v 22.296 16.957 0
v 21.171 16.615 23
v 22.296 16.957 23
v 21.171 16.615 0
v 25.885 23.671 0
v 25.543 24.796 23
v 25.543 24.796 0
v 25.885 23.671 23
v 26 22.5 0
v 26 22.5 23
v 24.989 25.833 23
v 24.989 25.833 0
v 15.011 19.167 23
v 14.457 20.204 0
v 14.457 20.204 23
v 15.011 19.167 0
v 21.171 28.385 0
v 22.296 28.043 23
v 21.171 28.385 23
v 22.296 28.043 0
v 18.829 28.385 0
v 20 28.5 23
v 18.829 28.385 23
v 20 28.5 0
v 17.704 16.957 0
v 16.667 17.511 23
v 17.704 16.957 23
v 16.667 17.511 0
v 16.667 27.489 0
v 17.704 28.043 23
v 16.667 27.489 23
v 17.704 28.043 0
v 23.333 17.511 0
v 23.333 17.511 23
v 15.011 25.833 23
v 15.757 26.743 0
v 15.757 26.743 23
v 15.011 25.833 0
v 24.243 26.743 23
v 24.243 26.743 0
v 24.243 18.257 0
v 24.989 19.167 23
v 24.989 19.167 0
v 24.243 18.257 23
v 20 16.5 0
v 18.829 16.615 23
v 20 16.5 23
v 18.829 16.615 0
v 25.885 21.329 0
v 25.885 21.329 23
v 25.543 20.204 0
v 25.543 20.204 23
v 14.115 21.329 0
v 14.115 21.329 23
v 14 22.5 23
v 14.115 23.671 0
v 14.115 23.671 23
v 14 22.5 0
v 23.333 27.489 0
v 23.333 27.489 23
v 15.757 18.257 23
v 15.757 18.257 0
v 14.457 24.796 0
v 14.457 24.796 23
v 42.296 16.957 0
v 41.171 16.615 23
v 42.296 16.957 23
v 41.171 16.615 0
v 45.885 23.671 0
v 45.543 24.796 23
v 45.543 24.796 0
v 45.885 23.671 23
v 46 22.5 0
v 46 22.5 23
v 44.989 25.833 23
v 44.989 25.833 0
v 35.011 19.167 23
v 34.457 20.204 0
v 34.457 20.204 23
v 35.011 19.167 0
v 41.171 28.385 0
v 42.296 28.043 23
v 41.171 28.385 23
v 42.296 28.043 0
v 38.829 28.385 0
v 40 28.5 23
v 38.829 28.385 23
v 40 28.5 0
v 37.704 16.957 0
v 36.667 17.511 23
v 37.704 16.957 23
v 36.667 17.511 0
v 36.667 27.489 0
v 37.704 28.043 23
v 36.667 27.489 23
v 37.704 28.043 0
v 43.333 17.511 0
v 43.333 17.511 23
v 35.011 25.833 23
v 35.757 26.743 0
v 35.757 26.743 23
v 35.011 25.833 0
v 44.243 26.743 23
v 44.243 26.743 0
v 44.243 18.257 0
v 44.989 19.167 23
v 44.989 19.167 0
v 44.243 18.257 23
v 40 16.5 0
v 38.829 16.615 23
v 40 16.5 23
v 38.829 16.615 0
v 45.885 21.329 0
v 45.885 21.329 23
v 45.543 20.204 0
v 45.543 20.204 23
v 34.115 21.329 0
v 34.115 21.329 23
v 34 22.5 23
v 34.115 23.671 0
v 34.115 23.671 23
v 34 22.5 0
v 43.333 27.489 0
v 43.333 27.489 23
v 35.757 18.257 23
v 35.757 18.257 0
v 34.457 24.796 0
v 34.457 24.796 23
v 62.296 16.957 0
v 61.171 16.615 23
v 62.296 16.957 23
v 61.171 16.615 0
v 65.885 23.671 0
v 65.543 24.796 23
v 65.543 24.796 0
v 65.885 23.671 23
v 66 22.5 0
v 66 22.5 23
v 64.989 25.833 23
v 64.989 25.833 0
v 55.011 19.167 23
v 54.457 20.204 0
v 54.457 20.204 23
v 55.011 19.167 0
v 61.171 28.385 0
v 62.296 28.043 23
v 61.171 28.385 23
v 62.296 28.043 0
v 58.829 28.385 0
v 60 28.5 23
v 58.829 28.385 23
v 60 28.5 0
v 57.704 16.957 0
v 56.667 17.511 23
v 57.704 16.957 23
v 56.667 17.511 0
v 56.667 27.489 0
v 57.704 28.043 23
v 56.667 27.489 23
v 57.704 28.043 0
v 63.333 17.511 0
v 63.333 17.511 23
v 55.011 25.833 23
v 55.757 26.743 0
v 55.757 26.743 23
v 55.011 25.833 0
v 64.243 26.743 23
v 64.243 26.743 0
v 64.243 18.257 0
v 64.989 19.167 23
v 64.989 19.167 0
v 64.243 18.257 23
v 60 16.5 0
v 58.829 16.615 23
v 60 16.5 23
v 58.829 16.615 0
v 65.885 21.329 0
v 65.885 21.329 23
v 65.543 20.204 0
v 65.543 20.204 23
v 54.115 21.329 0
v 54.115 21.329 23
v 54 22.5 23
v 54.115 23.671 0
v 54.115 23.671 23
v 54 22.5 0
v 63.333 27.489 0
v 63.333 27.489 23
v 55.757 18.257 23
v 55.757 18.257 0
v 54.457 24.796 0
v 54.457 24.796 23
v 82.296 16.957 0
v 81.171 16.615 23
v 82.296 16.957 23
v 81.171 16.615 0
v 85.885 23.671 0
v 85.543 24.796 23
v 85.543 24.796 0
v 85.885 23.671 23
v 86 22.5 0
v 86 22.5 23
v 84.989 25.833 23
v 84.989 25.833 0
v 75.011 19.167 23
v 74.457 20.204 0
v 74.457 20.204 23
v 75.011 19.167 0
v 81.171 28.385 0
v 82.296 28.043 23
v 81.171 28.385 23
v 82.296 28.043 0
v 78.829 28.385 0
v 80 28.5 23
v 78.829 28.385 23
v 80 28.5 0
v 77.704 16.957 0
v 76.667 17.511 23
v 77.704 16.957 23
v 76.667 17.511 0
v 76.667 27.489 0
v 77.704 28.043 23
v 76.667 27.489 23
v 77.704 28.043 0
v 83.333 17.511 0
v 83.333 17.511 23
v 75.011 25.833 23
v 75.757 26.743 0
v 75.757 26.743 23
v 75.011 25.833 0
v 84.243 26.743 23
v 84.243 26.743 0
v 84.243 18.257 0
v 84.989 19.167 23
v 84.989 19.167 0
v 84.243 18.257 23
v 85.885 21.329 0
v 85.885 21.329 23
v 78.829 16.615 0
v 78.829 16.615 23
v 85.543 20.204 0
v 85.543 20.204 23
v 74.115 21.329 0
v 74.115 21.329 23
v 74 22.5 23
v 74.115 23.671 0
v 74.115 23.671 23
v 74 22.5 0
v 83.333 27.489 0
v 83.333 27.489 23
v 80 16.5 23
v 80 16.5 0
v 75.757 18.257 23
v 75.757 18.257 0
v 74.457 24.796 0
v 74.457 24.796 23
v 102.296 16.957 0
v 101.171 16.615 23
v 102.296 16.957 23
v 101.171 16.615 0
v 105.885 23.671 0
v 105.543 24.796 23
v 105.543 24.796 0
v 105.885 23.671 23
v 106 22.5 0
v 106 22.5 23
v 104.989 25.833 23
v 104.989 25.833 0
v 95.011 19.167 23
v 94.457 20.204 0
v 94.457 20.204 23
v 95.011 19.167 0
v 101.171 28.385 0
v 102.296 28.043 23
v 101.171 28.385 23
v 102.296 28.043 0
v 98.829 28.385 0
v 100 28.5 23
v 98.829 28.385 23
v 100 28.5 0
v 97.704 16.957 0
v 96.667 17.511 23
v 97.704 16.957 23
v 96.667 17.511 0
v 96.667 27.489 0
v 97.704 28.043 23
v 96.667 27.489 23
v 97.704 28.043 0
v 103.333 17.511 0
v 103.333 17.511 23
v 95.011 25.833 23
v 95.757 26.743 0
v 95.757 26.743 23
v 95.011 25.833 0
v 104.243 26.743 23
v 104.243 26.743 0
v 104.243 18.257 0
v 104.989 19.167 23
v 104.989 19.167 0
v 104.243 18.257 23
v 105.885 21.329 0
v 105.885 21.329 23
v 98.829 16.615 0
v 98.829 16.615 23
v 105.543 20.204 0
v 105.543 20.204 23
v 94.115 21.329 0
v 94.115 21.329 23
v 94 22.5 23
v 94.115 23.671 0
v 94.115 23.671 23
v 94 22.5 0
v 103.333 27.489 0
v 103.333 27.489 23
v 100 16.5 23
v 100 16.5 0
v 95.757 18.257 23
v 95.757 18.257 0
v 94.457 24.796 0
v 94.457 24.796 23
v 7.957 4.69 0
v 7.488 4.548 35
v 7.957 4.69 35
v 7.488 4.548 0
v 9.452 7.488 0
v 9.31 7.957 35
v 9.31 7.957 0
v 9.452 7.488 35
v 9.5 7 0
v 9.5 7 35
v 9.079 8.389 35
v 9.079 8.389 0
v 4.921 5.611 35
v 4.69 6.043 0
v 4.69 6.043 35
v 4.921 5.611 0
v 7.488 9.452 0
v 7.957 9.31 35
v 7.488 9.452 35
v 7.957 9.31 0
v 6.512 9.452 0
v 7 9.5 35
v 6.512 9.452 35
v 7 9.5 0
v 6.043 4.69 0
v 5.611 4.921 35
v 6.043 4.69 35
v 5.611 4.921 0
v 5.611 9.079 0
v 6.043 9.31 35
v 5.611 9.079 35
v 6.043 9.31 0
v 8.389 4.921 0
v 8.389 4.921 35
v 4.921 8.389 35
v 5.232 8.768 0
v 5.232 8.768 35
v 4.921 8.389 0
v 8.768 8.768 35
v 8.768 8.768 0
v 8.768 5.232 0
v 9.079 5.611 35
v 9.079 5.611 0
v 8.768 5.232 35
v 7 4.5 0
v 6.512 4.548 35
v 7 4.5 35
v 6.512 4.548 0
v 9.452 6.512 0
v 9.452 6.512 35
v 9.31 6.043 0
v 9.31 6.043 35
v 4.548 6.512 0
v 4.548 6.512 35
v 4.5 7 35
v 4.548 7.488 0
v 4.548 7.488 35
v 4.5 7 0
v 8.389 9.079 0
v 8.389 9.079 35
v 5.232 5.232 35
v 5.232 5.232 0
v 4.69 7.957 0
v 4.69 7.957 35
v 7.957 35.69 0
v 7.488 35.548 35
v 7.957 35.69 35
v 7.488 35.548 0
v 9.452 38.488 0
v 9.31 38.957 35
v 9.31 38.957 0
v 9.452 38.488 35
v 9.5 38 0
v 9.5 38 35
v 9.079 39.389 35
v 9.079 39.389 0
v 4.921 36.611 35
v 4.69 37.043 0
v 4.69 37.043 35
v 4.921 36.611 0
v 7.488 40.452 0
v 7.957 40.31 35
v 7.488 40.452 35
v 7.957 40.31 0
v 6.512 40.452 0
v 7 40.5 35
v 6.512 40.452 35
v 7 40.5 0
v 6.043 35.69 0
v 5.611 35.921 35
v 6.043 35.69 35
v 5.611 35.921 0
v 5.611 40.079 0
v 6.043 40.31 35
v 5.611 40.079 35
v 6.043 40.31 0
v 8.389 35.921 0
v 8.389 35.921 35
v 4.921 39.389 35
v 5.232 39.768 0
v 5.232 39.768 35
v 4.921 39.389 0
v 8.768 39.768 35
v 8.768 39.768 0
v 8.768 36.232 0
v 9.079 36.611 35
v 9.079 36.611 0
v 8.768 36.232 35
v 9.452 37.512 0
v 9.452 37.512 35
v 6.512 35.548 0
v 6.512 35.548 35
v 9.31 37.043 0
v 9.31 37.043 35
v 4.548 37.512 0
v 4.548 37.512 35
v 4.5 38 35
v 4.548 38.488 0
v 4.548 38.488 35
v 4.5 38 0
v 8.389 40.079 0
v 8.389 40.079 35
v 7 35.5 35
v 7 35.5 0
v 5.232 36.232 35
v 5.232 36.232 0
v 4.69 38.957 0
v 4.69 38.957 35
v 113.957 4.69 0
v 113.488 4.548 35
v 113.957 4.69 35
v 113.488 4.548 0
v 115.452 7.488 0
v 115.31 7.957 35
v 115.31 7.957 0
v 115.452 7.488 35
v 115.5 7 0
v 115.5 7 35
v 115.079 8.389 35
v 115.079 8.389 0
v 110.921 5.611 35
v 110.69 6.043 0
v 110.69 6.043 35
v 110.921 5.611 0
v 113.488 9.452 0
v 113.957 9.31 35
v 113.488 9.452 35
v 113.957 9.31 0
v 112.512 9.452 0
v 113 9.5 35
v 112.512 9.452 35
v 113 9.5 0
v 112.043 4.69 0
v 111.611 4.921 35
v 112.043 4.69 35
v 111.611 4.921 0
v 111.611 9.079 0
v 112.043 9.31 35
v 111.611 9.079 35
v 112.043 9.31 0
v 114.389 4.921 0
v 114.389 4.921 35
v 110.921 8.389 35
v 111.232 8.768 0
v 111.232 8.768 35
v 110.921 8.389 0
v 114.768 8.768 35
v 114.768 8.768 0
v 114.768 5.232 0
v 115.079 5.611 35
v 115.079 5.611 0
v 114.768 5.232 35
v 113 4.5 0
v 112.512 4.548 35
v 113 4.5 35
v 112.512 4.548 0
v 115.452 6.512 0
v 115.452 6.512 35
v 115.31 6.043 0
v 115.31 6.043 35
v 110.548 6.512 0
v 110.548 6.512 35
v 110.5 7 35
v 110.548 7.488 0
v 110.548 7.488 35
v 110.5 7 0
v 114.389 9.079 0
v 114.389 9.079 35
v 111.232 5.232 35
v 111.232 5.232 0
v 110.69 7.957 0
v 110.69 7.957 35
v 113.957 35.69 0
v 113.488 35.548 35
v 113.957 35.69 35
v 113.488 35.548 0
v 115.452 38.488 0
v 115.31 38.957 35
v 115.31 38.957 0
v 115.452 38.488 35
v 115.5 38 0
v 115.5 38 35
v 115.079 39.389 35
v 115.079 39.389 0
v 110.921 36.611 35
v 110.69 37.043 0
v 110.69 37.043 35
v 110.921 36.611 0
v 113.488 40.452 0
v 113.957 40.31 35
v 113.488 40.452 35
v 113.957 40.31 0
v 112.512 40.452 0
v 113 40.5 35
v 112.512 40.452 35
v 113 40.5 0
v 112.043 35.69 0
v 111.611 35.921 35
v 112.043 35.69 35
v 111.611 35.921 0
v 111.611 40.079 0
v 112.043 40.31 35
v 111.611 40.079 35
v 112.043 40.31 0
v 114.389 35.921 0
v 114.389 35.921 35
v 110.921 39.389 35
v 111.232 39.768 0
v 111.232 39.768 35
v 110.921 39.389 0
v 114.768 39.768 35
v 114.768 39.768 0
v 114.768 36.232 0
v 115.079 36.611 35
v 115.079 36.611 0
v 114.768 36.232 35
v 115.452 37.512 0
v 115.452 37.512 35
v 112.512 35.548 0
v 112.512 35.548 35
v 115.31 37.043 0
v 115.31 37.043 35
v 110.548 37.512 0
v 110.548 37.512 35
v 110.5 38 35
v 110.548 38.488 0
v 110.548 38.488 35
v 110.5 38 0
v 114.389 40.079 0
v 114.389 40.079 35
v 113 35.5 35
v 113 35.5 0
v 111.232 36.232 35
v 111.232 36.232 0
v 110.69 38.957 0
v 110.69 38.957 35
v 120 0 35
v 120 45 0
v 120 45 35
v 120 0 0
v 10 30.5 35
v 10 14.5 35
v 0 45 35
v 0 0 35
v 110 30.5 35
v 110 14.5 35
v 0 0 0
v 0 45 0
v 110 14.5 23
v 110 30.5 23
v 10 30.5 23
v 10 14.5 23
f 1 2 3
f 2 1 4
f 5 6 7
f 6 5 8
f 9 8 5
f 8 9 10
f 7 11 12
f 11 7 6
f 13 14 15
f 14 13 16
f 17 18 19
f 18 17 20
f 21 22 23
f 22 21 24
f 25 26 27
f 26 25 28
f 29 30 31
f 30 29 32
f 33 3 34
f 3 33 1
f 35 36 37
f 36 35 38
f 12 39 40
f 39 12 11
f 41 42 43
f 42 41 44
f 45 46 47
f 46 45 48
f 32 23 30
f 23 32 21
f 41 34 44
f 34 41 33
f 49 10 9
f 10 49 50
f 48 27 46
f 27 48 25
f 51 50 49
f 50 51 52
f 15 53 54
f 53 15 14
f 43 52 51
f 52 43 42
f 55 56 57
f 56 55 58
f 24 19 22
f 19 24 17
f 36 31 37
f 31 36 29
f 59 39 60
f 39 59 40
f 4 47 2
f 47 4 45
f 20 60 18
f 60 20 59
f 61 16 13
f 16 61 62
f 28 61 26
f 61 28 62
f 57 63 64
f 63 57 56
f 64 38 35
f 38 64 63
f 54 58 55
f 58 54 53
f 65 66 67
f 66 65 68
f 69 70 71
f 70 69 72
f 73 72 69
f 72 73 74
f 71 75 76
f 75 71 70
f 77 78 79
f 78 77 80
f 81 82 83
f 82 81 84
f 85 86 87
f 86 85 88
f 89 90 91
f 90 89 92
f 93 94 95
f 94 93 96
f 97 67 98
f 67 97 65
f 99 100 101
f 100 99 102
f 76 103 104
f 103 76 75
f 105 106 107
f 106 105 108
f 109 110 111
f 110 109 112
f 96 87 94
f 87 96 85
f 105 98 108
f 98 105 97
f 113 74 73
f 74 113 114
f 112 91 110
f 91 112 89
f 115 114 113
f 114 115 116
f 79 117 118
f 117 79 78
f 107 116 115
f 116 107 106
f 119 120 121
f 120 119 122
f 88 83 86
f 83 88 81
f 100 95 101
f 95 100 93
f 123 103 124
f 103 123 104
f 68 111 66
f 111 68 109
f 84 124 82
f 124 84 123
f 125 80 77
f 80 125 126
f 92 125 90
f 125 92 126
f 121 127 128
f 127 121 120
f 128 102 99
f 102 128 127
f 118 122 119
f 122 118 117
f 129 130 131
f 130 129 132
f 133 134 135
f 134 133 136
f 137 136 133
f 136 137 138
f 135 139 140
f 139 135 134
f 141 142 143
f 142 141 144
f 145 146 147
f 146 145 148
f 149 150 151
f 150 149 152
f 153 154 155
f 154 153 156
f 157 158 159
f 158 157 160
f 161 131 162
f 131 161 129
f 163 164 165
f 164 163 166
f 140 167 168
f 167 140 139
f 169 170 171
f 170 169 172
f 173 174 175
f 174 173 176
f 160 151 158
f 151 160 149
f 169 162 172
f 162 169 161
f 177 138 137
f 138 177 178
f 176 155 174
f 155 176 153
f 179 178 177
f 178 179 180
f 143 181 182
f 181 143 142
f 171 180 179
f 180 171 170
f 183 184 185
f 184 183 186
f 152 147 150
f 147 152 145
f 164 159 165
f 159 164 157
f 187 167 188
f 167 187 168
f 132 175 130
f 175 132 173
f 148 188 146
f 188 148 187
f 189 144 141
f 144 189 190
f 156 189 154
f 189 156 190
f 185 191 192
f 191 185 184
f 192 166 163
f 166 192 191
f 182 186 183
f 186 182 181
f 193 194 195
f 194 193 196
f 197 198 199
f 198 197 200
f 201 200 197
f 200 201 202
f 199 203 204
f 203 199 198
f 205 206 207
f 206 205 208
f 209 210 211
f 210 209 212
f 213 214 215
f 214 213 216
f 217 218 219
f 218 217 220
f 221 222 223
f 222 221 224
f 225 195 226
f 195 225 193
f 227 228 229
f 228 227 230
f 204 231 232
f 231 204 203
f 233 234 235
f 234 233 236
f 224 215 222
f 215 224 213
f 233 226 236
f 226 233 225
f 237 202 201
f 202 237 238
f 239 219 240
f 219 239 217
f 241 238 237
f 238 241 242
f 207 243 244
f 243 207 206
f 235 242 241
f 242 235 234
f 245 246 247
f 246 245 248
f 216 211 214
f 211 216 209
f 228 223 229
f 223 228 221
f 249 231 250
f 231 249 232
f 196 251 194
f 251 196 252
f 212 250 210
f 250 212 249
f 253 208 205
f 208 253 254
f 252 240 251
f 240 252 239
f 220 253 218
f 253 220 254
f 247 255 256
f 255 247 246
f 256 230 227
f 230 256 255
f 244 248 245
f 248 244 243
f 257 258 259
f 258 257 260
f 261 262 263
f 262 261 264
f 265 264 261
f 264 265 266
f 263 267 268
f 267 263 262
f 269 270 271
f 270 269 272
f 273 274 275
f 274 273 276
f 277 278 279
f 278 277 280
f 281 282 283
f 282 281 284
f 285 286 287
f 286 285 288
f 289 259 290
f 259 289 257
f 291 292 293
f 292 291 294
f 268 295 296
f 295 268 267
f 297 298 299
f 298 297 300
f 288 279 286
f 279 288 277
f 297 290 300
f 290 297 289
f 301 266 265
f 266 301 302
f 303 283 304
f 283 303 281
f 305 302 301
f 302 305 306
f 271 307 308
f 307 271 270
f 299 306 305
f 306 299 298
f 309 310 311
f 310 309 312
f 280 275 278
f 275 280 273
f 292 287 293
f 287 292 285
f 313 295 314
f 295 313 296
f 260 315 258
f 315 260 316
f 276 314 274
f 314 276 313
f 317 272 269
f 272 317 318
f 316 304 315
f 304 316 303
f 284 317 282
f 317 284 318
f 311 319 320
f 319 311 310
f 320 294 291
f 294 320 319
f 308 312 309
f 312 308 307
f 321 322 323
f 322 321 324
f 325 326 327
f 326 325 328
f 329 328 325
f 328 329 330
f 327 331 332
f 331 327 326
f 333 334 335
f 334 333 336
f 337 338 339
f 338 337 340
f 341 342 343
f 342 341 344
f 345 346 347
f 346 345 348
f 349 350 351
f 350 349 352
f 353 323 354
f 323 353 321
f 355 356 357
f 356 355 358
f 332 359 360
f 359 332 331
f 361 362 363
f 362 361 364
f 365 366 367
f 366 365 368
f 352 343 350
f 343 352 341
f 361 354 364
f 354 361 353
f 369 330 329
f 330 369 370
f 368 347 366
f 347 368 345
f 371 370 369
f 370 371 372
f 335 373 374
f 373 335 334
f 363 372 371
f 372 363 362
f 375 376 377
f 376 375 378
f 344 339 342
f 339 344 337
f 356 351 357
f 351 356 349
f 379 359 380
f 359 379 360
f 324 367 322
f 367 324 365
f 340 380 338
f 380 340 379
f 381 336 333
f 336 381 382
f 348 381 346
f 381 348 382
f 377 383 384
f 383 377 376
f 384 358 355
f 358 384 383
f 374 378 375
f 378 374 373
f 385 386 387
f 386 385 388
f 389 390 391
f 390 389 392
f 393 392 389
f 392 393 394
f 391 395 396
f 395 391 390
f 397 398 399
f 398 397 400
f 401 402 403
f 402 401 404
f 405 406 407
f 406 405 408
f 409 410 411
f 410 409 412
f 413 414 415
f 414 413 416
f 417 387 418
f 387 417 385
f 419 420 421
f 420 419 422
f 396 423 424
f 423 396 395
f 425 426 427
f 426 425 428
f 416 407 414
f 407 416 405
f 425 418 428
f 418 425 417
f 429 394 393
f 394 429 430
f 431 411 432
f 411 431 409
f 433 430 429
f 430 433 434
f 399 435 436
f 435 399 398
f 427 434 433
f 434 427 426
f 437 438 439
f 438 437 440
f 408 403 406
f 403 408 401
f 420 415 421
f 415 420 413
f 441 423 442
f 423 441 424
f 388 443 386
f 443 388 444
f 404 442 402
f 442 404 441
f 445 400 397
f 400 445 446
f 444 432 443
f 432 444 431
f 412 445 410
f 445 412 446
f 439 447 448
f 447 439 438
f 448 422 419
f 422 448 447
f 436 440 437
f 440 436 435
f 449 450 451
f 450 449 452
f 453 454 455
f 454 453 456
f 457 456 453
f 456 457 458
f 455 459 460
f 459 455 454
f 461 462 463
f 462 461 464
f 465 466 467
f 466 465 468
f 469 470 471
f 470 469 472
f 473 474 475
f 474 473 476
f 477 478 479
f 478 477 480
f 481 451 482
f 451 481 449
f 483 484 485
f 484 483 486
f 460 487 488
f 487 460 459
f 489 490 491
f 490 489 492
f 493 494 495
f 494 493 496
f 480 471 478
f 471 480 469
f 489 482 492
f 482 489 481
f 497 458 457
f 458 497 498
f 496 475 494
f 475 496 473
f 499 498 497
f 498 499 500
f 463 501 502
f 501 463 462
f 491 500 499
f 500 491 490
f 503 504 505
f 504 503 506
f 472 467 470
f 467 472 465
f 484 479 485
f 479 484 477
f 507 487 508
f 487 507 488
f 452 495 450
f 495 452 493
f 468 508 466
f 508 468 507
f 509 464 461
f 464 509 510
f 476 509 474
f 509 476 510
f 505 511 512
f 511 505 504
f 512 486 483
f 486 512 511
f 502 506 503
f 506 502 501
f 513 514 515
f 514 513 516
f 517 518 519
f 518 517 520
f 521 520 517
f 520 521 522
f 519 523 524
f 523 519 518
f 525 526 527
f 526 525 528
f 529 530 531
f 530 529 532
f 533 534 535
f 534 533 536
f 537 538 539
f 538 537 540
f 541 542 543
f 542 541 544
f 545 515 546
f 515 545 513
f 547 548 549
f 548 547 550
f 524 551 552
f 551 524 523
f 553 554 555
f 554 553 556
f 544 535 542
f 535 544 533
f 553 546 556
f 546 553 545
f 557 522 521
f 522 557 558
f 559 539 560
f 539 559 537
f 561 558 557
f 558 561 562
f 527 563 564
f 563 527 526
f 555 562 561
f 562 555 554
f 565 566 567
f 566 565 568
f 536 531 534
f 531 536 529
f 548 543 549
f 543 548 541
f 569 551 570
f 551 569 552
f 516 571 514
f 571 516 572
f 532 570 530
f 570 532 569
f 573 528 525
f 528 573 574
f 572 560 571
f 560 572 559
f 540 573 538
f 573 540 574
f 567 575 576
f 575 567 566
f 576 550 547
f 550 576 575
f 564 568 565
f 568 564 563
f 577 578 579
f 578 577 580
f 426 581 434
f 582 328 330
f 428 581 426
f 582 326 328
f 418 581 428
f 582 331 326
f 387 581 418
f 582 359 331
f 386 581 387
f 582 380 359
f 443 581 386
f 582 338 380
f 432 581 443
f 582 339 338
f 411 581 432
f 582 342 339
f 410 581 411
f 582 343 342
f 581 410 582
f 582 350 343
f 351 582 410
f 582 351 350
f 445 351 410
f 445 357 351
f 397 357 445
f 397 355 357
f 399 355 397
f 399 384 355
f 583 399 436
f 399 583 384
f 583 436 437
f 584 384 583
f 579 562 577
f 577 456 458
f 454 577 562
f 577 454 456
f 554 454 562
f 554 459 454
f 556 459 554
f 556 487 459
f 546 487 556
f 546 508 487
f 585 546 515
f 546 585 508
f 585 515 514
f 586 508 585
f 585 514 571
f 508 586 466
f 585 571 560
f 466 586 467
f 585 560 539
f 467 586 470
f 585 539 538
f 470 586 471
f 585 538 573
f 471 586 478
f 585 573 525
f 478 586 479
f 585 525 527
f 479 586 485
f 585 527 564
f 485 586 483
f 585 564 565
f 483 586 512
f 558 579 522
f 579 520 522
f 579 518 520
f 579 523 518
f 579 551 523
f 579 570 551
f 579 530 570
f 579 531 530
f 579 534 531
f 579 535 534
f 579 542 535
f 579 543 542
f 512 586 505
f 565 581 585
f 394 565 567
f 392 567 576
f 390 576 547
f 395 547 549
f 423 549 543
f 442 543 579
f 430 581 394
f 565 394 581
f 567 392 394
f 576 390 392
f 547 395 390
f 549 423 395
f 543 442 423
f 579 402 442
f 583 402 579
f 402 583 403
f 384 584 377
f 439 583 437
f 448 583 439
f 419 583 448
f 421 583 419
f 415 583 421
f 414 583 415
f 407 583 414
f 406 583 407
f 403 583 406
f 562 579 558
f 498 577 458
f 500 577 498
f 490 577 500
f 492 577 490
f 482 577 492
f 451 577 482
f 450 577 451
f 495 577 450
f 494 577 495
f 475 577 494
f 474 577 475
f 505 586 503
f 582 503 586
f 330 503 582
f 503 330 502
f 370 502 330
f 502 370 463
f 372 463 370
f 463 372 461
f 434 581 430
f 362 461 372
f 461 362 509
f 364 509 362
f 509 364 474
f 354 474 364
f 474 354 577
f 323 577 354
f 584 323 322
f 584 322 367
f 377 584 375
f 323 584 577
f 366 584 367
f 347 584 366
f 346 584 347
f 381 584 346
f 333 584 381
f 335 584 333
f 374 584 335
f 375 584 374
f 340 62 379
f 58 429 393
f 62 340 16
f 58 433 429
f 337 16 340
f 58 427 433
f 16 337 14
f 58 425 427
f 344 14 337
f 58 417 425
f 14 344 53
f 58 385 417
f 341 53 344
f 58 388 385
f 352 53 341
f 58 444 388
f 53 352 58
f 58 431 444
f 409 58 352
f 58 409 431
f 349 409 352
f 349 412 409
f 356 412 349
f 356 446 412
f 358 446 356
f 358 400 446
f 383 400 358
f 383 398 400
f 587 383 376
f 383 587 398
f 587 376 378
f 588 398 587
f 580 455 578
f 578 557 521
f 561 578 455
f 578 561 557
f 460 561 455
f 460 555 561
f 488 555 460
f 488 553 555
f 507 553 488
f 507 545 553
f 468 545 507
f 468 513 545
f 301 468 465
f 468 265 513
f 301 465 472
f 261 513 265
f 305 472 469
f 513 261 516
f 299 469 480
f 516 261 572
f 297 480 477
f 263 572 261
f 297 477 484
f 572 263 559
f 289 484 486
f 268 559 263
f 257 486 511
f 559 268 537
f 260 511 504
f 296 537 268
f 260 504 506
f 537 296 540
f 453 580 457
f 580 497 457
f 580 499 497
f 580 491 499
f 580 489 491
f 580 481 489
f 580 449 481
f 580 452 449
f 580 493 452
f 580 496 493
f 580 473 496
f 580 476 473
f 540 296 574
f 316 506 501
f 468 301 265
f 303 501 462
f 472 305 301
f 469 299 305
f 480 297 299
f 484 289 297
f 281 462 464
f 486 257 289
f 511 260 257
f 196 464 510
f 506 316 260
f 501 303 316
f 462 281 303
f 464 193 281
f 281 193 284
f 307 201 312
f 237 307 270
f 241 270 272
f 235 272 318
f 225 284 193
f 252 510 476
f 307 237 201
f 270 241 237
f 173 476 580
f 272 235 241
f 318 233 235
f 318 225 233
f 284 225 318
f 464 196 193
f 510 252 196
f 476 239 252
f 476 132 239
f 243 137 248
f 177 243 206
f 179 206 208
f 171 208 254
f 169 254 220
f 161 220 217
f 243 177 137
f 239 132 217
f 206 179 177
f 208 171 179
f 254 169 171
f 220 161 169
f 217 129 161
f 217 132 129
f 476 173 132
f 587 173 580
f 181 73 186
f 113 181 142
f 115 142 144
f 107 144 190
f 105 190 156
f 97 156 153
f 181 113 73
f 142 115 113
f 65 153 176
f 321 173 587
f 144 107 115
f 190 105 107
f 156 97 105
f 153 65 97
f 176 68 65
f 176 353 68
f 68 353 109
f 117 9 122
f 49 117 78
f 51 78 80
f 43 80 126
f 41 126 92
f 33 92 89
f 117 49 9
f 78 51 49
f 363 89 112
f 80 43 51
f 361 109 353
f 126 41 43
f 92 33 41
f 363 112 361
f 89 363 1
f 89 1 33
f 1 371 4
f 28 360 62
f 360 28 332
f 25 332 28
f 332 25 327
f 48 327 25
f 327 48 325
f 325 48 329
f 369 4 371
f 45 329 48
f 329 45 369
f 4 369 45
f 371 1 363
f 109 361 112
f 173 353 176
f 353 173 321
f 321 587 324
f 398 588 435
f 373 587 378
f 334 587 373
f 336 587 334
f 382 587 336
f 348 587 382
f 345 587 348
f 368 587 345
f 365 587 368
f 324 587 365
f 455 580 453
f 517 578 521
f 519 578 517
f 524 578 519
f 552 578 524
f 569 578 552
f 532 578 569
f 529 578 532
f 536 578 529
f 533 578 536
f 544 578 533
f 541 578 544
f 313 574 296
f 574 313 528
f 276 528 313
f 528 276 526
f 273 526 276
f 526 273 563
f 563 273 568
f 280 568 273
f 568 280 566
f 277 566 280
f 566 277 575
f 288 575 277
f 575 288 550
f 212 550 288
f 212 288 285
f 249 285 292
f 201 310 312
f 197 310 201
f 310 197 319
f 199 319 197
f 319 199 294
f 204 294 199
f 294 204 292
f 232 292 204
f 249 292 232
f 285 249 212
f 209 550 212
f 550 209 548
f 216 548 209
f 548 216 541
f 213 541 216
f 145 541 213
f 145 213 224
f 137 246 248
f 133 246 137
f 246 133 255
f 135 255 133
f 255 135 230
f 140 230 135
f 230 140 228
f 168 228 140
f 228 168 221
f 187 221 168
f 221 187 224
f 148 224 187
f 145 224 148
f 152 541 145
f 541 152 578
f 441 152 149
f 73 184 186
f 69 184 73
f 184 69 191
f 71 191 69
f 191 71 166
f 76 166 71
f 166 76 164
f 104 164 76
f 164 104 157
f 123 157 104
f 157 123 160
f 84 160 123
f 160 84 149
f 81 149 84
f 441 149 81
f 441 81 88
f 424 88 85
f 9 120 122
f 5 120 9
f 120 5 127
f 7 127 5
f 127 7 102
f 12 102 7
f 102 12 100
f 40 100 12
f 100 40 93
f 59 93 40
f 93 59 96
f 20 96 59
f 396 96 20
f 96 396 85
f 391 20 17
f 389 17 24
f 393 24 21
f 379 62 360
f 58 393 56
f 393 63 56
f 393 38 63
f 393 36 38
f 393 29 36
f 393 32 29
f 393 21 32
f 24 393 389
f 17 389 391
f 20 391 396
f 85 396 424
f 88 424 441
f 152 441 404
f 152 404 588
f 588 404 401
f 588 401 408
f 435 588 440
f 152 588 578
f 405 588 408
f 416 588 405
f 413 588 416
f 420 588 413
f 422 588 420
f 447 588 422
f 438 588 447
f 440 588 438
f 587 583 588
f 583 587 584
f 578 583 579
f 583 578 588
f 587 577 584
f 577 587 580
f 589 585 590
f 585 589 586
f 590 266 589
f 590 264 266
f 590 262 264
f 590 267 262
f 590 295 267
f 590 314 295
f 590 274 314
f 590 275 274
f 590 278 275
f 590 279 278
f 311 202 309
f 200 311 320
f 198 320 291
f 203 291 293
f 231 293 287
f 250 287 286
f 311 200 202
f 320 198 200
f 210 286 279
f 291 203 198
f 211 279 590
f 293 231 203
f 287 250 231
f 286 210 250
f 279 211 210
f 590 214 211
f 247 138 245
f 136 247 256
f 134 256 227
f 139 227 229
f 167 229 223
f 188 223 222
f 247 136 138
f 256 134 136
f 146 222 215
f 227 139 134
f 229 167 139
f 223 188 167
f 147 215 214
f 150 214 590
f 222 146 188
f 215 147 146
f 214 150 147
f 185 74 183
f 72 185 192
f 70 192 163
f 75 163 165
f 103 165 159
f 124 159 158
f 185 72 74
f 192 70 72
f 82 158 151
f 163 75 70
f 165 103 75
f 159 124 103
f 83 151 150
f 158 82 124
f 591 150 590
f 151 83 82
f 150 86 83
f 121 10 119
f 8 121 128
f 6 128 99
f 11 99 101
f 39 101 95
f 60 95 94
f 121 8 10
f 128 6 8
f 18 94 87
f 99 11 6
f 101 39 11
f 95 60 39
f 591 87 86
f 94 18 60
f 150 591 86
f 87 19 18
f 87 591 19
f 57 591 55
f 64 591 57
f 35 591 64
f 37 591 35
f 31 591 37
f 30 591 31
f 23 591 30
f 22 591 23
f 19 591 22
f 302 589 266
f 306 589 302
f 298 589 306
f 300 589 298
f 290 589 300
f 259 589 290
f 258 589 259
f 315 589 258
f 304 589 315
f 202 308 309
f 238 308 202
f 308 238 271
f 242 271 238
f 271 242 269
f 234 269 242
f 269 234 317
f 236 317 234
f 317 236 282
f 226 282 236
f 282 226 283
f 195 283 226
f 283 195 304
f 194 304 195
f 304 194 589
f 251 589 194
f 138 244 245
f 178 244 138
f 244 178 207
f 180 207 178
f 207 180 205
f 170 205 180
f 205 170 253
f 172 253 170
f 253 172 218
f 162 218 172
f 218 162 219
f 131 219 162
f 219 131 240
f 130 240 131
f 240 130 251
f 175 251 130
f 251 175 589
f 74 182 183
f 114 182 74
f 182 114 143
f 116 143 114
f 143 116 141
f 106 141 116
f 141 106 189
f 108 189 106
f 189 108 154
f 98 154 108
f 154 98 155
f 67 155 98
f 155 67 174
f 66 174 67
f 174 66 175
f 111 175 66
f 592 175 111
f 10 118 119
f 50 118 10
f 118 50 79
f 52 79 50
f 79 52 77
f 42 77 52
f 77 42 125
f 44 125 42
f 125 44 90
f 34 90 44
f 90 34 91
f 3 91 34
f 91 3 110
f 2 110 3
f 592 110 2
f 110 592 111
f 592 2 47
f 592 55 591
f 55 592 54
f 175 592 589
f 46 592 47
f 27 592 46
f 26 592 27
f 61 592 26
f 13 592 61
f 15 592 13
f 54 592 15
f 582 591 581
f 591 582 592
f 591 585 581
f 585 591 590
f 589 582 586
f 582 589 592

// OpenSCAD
$fn = 32;

// ----------------------------------------------------------------------
// Manifold block: gallery_top manifold
// ----------------------------------------------------------------------

// --- parameters (mm) ---
block_l = 120;            // block length, X
block_w = 45;             // block width, Y
block_h = 35;             // block height, Z
port_d = 12;              // port bore diameter
port_pitch = 20;          // port pitch along X
gallery_d = 16;           // top gallery width, Y
gallery_depth = 12;       // gallery pocket depth
wall_p = 10;              // gallery end wall thickness, X
mnt_d = 5;                // mounting hole diameter
mnt_in = 7;               // mounting hole inset from the edges

n_ports = 5;  // ports in the row
port_x0 = (block_l - (n_ports - 1) * port_pitch) / 2;  // first port X

difference() {
  cube([block_l, block_w, block_h]);
  for (i = [0 : n_ports - 1])
    translate([port_x0 + i * port_pitch, block_w / 2, -1])
      cylinder(h = block_h + 2, d = port_d);
  translate([wall_p, block_w / 2 - gallery_d / 2, block_h - gallery_depth])
    cube([block_l - 2 * wall_p, gallery_d, gallery_depth + 1]);
  for (cx = [mnt_in, block_l - mnt_in])
    for (cy = [mnt_in, block_w - mnt_in])
      translate([cx, cy, -1]) cylinder(h = block_h + 2, d = mnt_d);
}
